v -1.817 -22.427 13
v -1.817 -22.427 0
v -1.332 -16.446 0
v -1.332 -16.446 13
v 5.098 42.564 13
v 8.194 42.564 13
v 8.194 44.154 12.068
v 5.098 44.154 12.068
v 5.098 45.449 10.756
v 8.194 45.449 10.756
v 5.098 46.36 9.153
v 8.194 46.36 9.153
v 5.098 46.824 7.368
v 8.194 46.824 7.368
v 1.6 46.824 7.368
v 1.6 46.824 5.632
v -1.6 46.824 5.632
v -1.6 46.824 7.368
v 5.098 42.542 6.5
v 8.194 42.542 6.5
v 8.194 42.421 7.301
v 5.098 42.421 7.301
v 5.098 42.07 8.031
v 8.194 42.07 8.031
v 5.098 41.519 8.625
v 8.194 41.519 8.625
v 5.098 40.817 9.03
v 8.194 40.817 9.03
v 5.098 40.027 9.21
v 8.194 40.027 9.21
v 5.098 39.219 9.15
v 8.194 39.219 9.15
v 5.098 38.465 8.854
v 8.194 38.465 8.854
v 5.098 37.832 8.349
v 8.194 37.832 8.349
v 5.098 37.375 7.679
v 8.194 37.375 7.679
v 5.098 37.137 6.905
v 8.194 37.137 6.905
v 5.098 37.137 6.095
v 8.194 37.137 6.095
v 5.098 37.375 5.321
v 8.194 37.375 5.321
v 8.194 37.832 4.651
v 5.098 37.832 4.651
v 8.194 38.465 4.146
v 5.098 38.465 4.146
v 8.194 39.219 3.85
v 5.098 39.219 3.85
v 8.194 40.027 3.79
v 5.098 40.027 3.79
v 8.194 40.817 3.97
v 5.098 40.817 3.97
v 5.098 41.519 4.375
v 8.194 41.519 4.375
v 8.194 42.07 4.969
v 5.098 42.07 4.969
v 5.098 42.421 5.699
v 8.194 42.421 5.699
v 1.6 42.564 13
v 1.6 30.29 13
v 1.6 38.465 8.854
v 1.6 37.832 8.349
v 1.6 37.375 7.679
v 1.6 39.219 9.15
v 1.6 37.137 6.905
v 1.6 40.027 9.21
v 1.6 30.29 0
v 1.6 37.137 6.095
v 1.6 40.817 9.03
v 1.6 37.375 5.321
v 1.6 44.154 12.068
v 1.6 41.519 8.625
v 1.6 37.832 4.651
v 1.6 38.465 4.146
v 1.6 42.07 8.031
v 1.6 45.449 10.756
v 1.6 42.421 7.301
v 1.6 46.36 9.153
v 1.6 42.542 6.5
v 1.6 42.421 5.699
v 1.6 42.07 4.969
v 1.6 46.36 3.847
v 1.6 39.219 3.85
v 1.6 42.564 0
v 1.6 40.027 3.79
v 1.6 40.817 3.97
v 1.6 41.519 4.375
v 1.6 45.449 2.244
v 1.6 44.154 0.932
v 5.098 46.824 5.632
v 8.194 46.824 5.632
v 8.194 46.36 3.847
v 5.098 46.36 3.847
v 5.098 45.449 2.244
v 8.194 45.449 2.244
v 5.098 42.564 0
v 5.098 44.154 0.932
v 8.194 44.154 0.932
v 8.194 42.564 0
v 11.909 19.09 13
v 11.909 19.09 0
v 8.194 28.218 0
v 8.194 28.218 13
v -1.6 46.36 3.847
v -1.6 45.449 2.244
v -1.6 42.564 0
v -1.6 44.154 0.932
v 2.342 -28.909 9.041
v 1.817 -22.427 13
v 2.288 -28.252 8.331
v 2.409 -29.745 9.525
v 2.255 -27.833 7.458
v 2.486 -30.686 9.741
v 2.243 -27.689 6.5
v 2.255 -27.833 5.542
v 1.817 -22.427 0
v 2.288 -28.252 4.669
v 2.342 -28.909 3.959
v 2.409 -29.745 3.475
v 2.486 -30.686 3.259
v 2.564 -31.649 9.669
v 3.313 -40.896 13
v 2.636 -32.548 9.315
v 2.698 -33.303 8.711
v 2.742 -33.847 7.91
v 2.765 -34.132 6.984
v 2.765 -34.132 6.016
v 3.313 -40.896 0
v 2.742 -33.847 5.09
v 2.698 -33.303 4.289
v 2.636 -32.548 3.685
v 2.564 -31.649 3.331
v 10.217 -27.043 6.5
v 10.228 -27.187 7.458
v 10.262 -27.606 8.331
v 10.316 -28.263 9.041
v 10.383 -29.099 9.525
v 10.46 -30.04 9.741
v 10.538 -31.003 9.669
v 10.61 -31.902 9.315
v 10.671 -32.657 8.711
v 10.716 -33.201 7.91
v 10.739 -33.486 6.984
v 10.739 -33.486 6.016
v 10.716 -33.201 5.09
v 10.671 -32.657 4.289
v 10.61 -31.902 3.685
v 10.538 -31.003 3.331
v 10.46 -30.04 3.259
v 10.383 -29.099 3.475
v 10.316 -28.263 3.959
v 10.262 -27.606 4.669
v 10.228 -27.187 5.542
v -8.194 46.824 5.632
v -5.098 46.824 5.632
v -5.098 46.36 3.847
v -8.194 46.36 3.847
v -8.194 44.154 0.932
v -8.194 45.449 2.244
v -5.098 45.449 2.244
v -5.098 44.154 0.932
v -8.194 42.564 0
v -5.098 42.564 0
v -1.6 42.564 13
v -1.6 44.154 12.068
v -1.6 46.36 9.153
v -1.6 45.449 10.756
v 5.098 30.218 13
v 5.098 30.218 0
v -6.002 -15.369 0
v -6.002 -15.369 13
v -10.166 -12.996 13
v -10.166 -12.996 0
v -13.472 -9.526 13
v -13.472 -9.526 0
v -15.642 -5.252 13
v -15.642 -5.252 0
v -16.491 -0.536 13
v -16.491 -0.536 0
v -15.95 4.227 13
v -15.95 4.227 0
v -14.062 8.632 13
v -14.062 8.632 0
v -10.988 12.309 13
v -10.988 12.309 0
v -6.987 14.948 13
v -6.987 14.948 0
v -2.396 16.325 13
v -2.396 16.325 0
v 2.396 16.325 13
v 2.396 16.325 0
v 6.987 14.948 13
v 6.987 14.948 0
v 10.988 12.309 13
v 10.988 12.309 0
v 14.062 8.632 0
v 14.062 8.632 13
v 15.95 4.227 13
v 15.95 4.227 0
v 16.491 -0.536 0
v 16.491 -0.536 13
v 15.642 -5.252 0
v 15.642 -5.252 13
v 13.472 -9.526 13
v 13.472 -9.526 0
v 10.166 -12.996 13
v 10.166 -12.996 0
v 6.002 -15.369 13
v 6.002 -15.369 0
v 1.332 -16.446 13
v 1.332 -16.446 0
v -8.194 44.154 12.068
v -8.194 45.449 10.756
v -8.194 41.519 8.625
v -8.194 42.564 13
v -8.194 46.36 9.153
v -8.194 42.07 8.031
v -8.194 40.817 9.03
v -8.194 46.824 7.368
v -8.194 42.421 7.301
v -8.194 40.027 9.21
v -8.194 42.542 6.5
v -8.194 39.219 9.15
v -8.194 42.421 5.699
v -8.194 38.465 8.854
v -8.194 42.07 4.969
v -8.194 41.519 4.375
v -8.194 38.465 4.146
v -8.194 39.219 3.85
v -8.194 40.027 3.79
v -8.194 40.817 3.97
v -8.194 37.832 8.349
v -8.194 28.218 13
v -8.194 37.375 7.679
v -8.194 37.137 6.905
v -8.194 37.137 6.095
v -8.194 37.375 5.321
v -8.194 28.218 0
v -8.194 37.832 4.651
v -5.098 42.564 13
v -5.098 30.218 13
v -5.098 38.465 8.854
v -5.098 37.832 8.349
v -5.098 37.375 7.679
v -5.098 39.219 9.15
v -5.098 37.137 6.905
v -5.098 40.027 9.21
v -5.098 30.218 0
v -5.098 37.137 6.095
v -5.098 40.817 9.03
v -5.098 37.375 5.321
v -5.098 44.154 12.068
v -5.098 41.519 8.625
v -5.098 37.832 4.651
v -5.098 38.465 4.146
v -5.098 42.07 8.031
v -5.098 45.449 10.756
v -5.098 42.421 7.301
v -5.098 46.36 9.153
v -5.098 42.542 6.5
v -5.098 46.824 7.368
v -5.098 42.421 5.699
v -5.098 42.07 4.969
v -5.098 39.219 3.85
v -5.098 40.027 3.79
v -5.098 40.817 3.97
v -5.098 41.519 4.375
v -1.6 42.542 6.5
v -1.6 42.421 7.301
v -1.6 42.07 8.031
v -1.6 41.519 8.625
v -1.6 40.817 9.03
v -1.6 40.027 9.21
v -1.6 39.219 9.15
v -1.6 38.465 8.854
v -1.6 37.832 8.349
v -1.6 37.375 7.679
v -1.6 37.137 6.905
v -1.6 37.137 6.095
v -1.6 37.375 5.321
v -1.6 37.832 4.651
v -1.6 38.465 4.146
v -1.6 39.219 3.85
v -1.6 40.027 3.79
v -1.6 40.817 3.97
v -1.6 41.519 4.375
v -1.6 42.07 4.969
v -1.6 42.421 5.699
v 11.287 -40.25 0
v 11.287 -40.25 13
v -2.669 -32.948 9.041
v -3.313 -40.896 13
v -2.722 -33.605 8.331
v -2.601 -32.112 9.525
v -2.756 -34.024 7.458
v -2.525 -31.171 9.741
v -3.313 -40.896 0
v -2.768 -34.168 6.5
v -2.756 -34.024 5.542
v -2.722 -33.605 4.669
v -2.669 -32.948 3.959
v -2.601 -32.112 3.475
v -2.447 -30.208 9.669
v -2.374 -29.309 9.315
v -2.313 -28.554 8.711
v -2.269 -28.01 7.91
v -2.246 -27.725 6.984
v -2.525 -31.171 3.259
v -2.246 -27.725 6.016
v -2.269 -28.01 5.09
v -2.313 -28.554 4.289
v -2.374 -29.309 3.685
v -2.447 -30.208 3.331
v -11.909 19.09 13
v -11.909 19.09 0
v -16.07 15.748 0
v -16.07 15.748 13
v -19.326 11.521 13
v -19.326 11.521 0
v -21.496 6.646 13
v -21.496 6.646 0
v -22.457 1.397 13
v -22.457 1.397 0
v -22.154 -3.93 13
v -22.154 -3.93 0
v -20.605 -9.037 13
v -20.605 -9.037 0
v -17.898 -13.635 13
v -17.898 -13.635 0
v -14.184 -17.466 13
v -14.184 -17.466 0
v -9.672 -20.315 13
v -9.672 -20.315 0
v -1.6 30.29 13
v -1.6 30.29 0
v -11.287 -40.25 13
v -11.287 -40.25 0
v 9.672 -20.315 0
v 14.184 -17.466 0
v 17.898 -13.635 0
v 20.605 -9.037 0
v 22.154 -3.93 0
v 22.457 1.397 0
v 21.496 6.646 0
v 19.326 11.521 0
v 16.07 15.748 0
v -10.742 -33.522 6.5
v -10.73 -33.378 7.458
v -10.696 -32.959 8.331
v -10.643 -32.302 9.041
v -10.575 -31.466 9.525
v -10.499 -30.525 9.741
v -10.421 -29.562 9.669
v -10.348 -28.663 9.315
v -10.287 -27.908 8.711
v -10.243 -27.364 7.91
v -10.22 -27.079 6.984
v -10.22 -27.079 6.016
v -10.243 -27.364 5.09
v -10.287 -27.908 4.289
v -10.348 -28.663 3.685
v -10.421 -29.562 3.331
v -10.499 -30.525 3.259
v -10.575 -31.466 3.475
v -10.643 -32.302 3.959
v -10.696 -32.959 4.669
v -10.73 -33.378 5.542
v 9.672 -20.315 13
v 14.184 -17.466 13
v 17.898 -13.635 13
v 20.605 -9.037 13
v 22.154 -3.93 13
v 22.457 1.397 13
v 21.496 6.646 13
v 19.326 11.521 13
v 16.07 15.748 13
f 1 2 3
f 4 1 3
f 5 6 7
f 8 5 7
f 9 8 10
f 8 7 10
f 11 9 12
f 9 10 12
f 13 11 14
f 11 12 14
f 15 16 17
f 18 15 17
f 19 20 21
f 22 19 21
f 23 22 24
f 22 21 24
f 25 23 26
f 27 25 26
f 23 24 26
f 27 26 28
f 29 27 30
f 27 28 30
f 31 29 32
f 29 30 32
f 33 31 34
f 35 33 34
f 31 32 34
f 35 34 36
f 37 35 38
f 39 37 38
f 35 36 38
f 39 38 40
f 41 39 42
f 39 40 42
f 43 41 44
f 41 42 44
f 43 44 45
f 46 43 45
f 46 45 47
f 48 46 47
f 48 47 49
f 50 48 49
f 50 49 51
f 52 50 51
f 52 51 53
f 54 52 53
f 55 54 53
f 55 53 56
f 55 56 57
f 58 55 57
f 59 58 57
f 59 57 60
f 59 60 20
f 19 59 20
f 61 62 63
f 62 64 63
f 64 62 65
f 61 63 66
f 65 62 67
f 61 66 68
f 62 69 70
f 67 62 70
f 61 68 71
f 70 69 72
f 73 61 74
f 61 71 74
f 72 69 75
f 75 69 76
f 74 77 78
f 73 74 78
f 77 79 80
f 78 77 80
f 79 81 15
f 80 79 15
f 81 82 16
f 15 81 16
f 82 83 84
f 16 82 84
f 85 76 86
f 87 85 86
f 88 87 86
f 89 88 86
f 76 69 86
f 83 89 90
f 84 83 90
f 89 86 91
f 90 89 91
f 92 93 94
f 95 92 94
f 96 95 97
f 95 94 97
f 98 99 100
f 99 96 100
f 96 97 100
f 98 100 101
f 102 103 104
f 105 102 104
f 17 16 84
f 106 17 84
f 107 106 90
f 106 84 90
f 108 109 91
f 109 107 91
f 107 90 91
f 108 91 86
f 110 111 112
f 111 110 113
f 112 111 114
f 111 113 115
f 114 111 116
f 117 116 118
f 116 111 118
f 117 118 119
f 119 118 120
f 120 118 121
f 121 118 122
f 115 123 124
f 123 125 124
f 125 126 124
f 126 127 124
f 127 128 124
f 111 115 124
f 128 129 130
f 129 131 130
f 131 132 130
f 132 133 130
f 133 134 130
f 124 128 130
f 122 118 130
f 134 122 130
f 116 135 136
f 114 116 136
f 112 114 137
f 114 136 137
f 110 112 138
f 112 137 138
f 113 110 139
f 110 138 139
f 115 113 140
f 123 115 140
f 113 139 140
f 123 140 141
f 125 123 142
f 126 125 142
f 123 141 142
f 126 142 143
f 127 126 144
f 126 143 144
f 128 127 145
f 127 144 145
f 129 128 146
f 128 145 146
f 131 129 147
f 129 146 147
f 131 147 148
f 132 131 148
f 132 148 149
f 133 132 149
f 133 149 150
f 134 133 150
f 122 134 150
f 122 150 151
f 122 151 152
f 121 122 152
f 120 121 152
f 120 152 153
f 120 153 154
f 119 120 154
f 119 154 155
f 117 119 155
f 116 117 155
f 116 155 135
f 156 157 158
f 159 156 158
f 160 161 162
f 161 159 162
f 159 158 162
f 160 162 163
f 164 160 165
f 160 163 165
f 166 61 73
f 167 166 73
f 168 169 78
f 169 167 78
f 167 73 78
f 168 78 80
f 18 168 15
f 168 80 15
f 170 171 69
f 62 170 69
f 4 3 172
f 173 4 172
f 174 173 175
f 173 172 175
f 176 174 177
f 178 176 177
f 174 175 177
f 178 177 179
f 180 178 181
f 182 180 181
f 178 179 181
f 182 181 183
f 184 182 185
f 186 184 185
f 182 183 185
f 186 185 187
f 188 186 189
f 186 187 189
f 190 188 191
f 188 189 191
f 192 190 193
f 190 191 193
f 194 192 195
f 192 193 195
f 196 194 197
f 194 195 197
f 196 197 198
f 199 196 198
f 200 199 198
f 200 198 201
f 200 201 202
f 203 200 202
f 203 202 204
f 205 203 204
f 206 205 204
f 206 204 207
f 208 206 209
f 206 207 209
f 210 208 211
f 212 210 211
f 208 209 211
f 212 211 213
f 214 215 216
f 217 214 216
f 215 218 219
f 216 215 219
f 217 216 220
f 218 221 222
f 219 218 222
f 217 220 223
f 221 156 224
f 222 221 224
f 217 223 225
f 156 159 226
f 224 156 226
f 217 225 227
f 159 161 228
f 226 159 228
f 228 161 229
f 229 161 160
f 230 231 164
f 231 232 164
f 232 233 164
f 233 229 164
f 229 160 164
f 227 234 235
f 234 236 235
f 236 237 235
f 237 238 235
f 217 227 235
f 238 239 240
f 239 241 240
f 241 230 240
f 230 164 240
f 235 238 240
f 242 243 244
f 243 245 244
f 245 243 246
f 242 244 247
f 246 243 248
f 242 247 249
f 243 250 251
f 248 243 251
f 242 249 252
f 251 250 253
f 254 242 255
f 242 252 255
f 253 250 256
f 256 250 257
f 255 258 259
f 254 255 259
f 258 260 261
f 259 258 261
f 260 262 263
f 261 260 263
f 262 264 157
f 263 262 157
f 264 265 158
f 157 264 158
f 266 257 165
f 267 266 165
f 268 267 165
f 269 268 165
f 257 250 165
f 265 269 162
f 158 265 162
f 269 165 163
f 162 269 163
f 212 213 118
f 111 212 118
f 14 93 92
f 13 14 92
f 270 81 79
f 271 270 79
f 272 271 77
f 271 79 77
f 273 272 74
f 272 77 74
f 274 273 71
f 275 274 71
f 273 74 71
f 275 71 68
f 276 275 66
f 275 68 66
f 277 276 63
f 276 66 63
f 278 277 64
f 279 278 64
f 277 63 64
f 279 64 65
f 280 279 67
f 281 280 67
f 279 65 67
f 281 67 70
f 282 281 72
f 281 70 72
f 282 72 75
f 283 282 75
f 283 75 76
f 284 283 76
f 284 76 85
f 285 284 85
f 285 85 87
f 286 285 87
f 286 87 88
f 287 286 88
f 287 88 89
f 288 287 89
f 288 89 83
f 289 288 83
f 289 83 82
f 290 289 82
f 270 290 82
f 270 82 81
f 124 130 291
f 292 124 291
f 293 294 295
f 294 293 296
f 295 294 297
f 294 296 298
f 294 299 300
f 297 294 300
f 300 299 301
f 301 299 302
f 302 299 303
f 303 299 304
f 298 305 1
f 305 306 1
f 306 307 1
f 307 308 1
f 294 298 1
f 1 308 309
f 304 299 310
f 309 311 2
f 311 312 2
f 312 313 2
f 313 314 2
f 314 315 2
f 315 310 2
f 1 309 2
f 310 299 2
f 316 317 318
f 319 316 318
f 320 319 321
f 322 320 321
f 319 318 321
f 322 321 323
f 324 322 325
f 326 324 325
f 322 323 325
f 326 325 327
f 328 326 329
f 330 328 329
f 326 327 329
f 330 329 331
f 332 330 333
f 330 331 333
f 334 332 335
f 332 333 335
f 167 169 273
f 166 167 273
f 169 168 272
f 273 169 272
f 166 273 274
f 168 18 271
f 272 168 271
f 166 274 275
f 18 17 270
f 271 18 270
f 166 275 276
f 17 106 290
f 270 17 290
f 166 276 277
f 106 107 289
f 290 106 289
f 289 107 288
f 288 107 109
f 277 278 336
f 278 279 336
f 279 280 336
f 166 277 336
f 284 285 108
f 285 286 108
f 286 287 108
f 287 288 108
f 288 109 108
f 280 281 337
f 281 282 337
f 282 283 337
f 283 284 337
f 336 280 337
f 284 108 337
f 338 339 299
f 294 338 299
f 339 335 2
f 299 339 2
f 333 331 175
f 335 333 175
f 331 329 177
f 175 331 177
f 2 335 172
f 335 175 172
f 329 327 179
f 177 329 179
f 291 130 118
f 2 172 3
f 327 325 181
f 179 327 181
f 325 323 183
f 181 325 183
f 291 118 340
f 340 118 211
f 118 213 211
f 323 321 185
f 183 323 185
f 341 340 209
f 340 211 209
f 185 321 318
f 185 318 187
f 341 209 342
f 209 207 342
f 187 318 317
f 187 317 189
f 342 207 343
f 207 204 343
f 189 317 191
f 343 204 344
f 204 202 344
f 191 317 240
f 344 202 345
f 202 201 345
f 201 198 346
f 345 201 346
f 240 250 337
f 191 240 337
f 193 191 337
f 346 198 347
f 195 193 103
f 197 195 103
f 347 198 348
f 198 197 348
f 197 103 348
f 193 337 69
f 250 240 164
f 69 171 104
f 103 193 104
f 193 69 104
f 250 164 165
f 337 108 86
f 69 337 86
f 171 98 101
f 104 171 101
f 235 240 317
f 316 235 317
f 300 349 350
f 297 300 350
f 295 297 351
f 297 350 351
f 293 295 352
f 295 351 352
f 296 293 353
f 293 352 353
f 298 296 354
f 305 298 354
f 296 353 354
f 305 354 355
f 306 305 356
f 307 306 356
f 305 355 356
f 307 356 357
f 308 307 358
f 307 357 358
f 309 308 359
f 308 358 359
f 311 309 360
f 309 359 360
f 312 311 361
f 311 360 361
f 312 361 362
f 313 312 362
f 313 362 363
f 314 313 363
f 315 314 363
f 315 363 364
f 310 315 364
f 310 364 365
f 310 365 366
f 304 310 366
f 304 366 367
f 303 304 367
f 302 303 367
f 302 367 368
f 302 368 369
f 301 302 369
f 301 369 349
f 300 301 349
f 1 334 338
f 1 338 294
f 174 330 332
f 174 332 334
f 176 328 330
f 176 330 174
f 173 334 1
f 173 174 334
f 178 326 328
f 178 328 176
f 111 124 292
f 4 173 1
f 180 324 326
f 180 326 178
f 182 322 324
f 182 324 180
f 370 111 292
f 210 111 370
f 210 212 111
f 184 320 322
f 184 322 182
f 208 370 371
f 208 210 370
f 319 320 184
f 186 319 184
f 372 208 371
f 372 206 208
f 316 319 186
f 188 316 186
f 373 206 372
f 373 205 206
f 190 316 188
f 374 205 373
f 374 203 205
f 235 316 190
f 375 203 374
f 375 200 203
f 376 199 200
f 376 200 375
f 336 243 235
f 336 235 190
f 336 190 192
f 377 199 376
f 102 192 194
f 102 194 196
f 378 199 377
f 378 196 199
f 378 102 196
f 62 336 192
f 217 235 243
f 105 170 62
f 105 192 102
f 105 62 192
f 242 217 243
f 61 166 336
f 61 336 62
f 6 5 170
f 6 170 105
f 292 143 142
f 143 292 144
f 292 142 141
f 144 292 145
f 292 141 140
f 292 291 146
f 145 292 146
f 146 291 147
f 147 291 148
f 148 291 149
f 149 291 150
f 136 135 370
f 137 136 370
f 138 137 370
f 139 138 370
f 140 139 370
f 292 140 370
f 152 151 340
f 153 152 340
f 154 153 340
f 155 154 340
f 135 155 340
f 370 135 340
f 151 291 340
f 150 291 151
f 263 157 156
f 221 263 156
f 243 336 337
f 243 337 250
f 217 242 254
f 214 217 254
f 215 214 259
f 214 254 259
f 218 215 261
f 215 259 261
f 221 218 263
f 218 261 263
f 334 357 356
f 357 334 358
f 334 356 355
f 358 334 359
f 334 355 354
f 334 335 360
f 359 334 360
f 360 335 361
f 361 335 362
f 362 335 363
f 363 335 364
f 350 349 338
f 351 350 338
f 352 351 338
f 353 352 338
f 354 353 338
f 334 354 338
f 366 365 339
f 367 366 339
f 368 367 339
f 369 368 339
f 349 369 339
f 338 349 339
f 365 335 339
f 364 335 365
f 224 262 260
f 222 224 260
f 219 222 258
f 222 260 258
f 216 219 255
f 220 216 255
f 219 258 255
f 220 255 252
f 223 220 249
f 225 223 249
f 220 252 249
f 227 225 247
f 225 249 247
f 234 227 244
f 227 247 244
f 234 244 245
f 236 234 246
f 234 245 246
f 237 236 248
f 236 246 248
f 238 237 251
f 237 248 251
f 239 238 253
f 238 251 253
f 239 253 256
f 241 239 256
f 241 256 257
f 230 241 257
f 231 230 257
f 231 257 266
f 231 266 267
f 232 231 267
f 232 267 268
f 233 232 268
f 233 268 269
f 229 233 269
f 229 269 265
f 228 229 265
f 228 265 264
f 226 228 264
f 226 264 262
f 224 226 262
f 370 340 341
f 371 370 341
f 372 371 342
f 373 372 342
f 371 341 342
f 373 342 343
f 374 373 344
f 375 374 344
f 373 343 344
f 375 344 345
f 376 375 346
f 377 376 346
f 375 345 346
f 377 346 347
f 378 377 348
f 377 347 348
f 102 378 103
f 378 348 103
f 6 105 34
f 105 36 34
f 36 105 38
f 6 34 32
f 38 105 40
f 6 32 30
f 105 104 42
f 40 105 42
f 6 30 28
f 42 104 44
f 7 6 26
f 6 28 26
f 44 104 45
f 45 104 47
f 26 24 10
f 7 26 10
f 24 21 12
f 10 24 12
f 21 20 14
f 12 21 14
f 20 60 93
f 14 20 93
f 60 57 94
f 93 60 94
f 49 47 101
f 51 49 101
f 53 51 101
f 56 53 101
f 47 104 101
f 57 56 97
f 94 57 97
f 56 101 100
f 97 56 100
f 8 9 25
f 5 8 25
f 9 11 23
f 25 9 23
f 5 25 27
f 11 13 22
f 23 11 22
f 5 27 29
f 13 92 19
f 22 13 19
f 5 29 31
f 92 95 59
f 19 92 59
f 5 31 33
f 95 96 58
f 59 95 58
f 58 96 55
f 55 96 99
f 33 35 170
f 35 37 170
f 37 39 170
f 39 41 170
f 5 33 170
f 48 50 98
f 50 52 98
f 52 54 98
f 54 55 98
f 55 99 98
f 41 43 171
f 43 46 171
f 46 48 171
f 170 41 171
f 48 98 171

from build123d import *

# Parameters (mm, degrees)
F1_DEPTH = 13
F3_DEPTH = 17
F2_R     = 2.7179879064
F4_DEPTH = 17
F5_R     = 3.25
F6_DEPTH = 13
F7_R     = 3.25
F8_DEPTH = 13


with BuildPart() as f1:
    # F0 (on Top) → F1 (new body)
    with BuildSketch(Plane.XY):
        with BuildLine():
            Line((11.2865111771, -40.2498981271), (9.6717664856, -20.3151897123))
            ThreePointArc((9.6717664856, -20.3151897123), (22.4638141096, -1.275560915), (11.9092941804, 19.0897541138))
            ThreePointArc((11.9092941804, 19.0897541138), (10.094643898, 20.1084102945), (8.1936409697, 20.955053034))
            ThreePointArc((8.1936409697, 20.955053034), (0, 22.5), (-8.1936409697, 20.955053034))
            ThreePointArc((-8.1936409697, 20.955053034), (-10.094643898, 20.1084102945), (-11.9092941804, 19.0897541138))
            ThreePointArc((-11.9092941804, 19.0897541138), (-22.4638141096, -1.275560915), (-9.6717664856, -20.3151897123))
            Line((-9.6717664856, -20.3151897123), (-11.2865111771, -40.2498981271))
            Line((-11.2865111771, -40.2498981271), (-3.3126278112, -40.8957960037))
            Line((-3.3126278112, -40.8957960037), (-1.816587778, -22.4265469666))
            Line((-1.816587778, -22.4265469666), (-1.3321643705, -16.4461344422))
            ThreePointArc((-1.3321643705, -16.4461344422), (0, 16.5), (1.3321643705, -16.4461344422))
            Line((1.3321643705, -16.4461344422), (1.816587778, -22.4265469666))
            Line((1.816587778, -22.4265469666), (3.3126278112, -40.8957960037))
            Line((3.3126278112, -40.8957960037), (11.2865111771, -40.2498981271))
        make_face()
        with BuildLine():
            ThreePointArc((8.1936409697, 20.955053034), (10.094643898, 20.1084102945), (11.9092941804, 19.0897541138))
            Line((11.9092941804, 19.0897541138), (8.1936409697, 28.2182842493))
            Line((8.1936409697, 28.2182842493), (8.1936409697, 20.955053034))
        make_face()
        with BuildLine():
            ThreePointArc((-8.1936409697, 20.955053034), (0, 22.5), (8.1936409697, 20.955053034))
            Line((8.1936409697, 20.955053034), (8.1936409697, 28.2182842493))
            Line((8.1936409697, 28.2182842493), (8.1936409697, 46.824157238))
            Line((8.1936409697, 46.824157238), (5.0982660614, 46.824157238))
            Line((5.0982660614, 46.824157238), (5.0982660614, 30.2175015012))
            Line((5.0982660614, 30.2175015012), (1.6, 30.2903222447))
            Line((1.6, 30.2903222447), (1.6, 46.824157238))
            Line((1.6, 46.824157238), (0, 46.824157238))
            Line((0, 46.824157238), (-1.6, 46.824157238))
            Line((-1.6, 46.824157238), (-1.6, 30.2903222447))
            Line((-1.6, 30.2903222447), (-5.0982660614, 30.2175015012))
            Line((-5.0982660614, 30.2175015012), (-5.0982660614, 46.824157238))
            Line((-5.0982660614, 46.824157238), (-8.1936409697, 46.824157238))
            Line((-8.1936409697, 46.824157238), (-8.1936409697, 33.1387296319))
            Line((-8.1936409697, 33.1387296319), (-8.1936409697, 28.2182842493))
            Line((-8.1936409697, 28.2182842493), (-8.1936409697, 20.955053034))
        make_face()
        with BuildLine():
            ThreePointArc((-11.9092941804, 19.0897541138), (-10.094643898, 20.1084102945), (-8.1936409697, 20.955053034))
            Line((-8.1936409697, 20.955053034), (-8.1936409697, 28.2182842493))
            Line((-8.1936409697, 28.2182842493), (-11.9092941804, 19.0897541138))
        make_face()
    extrude(amount=F1_DEPTH)

    # F2 (on face) → F3 (cut)
    with BuildSketch(Plane.YZ.offset(8.1936409697)):
        with BuildLine():
            ThreePointArc((42.5635200859, 13), (45.44932769, 10.755768579), (46.824157238, 7.3683943876))
            Line((46.824157238, 7.3683943876), (46.824157238, 13))
            Line((46.824157238, 13), (42.5635200859, 13))
        make_face()
        with BuildLine():
            Line((46.824157238, 0), (46.824157238, 5.6316056124))
            ThreePointArc((46.824157238, 5.6316056124), (45.44932769, 2.244231421), (42.5635200859, 0))
            Line((42.5635200859, 0), (46.824157238, 0))
        make_face()
    extrude(amount=-F3_DEPTH, mode=Mode.SUBTRACT)

    # F2 (on face) → F4 (cut)
    with BuildSketch(Plane.YZ.offset(8.1936409697)):
        with Locations((39.824157238, 6.5)):
            Circle(F2_R)
    extrude(amount=-F4_DEPTH, mode=Mode.SUBTRACT)

    # F5 (on face) → F6 (cut)
    with BuildSketch(Plane(origin=(7.9738833659, 0.6458978766, 0), x_dir=(-0.0807372346, 0.9967354207, 0), z_dir=(0.9967354207, 0.0807372346, 0))):
        with Locations((-31.0297408448, 6.5)):
            Circle(F5_R)
    extrude(amount=-F6_DEPTH, mode=Mode.SUBTRACT)

    # F7 (on face) → F8 (cut)
    with BuildSketch(Plane(origin=(-7.9738833659, 0.6458978766, 0), x_dir=(-0.0807372346, -0.9967354207, 0), z_dir=(-0.9967354207, 0.0807372346, 0))):
        with Locations((31.0297408448, 6.5)):
            Circle(F7_R)
    extrude(amount=-F8_DEPTH, mode=Mode.SUBTRACT)


solid = f1.part
